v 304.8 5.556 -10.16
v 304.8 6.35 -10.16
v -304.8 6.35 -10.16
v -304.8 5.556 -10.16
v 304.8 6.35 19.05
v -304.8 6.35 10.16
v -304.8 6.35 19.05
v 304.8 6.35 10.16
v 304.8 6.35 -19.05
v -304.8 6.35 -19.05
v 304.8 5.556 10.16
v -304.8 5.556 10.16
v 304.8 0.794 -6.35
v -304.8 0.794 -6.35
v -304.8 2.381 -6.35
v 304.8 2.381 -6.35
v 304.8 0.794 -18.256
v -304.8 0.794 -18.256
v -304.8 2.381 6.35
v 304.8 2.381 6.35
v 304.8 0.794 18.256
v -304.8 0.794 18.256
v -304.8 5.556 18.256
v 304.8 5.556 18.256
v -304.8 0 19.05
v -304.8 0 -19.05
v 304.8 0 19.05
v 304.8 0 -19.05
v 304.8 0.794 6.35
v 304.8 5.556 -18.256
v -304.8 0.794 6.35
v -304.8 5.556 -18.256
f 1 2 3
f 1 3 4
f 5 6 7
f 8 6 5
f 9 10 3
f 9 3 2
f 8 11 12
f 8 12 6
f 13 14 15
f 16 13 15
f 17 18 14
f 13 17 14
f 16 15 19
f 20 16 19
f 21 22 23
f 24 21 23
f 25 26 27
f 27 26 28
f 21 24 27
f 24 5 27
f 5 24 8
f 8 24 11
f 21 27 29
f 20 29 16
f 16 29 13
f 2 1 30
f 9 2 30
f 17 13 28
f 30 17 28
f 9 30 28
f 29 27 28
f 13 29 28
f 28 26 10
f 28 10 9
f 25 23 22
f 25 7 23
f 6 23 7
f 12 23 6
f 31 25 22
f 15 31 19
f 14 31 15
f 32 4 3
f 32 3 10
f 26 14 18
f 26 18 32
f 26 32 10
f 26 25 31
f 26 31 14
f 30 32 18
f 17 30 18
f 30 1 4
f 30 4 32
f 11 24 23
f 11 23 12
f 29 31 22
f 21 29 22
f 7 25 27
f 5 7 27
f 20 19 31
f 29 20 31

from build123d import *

# Parameters (mm, degrees)
SKETCH1_W           = 609.6
SKETCH1_H           = 38.1
BOSS_EXTRUDE1_DEPTH = 6.35
CUT_EXTRUDE1_DEPTH  = 609.6


with BuildPart() as part:
    # Sketch1 → Boss-Extrude1 (new body)
    with BuildSketch(Plane(origin=(0, 0, 0), x_dir=(1, 0, 0), z_dir=(0, 1, 0))):
        Rectangle(SKETCH1_W, SKETCH1_H)
    extrude(amount=BOSS_EXTRUDE1_DEPTH)

    # Sketch2 → Cut-Extrude1 (cut)
    with BuildSketch(Plane.ZY.offset(304.8)):
        Polygon((-10.16, 6.35), (-10.16, 5.55625), (-18.25625, 5.55625), (-18.25625, 0.79375), (-6.35, 0.79375), (-6.35, 2.38125), (6.35, 2.38125), (6.35, 0.79375), (18.25625, 0.79375), (18.25625, 5.55625), (10.16, 5.55625), (10.16, 6.35), align=None)
    extrude(amount=-CUT_EXTRUDE1_DEPTH, mode=Mode.SUBTRACT)


solid = part.part
